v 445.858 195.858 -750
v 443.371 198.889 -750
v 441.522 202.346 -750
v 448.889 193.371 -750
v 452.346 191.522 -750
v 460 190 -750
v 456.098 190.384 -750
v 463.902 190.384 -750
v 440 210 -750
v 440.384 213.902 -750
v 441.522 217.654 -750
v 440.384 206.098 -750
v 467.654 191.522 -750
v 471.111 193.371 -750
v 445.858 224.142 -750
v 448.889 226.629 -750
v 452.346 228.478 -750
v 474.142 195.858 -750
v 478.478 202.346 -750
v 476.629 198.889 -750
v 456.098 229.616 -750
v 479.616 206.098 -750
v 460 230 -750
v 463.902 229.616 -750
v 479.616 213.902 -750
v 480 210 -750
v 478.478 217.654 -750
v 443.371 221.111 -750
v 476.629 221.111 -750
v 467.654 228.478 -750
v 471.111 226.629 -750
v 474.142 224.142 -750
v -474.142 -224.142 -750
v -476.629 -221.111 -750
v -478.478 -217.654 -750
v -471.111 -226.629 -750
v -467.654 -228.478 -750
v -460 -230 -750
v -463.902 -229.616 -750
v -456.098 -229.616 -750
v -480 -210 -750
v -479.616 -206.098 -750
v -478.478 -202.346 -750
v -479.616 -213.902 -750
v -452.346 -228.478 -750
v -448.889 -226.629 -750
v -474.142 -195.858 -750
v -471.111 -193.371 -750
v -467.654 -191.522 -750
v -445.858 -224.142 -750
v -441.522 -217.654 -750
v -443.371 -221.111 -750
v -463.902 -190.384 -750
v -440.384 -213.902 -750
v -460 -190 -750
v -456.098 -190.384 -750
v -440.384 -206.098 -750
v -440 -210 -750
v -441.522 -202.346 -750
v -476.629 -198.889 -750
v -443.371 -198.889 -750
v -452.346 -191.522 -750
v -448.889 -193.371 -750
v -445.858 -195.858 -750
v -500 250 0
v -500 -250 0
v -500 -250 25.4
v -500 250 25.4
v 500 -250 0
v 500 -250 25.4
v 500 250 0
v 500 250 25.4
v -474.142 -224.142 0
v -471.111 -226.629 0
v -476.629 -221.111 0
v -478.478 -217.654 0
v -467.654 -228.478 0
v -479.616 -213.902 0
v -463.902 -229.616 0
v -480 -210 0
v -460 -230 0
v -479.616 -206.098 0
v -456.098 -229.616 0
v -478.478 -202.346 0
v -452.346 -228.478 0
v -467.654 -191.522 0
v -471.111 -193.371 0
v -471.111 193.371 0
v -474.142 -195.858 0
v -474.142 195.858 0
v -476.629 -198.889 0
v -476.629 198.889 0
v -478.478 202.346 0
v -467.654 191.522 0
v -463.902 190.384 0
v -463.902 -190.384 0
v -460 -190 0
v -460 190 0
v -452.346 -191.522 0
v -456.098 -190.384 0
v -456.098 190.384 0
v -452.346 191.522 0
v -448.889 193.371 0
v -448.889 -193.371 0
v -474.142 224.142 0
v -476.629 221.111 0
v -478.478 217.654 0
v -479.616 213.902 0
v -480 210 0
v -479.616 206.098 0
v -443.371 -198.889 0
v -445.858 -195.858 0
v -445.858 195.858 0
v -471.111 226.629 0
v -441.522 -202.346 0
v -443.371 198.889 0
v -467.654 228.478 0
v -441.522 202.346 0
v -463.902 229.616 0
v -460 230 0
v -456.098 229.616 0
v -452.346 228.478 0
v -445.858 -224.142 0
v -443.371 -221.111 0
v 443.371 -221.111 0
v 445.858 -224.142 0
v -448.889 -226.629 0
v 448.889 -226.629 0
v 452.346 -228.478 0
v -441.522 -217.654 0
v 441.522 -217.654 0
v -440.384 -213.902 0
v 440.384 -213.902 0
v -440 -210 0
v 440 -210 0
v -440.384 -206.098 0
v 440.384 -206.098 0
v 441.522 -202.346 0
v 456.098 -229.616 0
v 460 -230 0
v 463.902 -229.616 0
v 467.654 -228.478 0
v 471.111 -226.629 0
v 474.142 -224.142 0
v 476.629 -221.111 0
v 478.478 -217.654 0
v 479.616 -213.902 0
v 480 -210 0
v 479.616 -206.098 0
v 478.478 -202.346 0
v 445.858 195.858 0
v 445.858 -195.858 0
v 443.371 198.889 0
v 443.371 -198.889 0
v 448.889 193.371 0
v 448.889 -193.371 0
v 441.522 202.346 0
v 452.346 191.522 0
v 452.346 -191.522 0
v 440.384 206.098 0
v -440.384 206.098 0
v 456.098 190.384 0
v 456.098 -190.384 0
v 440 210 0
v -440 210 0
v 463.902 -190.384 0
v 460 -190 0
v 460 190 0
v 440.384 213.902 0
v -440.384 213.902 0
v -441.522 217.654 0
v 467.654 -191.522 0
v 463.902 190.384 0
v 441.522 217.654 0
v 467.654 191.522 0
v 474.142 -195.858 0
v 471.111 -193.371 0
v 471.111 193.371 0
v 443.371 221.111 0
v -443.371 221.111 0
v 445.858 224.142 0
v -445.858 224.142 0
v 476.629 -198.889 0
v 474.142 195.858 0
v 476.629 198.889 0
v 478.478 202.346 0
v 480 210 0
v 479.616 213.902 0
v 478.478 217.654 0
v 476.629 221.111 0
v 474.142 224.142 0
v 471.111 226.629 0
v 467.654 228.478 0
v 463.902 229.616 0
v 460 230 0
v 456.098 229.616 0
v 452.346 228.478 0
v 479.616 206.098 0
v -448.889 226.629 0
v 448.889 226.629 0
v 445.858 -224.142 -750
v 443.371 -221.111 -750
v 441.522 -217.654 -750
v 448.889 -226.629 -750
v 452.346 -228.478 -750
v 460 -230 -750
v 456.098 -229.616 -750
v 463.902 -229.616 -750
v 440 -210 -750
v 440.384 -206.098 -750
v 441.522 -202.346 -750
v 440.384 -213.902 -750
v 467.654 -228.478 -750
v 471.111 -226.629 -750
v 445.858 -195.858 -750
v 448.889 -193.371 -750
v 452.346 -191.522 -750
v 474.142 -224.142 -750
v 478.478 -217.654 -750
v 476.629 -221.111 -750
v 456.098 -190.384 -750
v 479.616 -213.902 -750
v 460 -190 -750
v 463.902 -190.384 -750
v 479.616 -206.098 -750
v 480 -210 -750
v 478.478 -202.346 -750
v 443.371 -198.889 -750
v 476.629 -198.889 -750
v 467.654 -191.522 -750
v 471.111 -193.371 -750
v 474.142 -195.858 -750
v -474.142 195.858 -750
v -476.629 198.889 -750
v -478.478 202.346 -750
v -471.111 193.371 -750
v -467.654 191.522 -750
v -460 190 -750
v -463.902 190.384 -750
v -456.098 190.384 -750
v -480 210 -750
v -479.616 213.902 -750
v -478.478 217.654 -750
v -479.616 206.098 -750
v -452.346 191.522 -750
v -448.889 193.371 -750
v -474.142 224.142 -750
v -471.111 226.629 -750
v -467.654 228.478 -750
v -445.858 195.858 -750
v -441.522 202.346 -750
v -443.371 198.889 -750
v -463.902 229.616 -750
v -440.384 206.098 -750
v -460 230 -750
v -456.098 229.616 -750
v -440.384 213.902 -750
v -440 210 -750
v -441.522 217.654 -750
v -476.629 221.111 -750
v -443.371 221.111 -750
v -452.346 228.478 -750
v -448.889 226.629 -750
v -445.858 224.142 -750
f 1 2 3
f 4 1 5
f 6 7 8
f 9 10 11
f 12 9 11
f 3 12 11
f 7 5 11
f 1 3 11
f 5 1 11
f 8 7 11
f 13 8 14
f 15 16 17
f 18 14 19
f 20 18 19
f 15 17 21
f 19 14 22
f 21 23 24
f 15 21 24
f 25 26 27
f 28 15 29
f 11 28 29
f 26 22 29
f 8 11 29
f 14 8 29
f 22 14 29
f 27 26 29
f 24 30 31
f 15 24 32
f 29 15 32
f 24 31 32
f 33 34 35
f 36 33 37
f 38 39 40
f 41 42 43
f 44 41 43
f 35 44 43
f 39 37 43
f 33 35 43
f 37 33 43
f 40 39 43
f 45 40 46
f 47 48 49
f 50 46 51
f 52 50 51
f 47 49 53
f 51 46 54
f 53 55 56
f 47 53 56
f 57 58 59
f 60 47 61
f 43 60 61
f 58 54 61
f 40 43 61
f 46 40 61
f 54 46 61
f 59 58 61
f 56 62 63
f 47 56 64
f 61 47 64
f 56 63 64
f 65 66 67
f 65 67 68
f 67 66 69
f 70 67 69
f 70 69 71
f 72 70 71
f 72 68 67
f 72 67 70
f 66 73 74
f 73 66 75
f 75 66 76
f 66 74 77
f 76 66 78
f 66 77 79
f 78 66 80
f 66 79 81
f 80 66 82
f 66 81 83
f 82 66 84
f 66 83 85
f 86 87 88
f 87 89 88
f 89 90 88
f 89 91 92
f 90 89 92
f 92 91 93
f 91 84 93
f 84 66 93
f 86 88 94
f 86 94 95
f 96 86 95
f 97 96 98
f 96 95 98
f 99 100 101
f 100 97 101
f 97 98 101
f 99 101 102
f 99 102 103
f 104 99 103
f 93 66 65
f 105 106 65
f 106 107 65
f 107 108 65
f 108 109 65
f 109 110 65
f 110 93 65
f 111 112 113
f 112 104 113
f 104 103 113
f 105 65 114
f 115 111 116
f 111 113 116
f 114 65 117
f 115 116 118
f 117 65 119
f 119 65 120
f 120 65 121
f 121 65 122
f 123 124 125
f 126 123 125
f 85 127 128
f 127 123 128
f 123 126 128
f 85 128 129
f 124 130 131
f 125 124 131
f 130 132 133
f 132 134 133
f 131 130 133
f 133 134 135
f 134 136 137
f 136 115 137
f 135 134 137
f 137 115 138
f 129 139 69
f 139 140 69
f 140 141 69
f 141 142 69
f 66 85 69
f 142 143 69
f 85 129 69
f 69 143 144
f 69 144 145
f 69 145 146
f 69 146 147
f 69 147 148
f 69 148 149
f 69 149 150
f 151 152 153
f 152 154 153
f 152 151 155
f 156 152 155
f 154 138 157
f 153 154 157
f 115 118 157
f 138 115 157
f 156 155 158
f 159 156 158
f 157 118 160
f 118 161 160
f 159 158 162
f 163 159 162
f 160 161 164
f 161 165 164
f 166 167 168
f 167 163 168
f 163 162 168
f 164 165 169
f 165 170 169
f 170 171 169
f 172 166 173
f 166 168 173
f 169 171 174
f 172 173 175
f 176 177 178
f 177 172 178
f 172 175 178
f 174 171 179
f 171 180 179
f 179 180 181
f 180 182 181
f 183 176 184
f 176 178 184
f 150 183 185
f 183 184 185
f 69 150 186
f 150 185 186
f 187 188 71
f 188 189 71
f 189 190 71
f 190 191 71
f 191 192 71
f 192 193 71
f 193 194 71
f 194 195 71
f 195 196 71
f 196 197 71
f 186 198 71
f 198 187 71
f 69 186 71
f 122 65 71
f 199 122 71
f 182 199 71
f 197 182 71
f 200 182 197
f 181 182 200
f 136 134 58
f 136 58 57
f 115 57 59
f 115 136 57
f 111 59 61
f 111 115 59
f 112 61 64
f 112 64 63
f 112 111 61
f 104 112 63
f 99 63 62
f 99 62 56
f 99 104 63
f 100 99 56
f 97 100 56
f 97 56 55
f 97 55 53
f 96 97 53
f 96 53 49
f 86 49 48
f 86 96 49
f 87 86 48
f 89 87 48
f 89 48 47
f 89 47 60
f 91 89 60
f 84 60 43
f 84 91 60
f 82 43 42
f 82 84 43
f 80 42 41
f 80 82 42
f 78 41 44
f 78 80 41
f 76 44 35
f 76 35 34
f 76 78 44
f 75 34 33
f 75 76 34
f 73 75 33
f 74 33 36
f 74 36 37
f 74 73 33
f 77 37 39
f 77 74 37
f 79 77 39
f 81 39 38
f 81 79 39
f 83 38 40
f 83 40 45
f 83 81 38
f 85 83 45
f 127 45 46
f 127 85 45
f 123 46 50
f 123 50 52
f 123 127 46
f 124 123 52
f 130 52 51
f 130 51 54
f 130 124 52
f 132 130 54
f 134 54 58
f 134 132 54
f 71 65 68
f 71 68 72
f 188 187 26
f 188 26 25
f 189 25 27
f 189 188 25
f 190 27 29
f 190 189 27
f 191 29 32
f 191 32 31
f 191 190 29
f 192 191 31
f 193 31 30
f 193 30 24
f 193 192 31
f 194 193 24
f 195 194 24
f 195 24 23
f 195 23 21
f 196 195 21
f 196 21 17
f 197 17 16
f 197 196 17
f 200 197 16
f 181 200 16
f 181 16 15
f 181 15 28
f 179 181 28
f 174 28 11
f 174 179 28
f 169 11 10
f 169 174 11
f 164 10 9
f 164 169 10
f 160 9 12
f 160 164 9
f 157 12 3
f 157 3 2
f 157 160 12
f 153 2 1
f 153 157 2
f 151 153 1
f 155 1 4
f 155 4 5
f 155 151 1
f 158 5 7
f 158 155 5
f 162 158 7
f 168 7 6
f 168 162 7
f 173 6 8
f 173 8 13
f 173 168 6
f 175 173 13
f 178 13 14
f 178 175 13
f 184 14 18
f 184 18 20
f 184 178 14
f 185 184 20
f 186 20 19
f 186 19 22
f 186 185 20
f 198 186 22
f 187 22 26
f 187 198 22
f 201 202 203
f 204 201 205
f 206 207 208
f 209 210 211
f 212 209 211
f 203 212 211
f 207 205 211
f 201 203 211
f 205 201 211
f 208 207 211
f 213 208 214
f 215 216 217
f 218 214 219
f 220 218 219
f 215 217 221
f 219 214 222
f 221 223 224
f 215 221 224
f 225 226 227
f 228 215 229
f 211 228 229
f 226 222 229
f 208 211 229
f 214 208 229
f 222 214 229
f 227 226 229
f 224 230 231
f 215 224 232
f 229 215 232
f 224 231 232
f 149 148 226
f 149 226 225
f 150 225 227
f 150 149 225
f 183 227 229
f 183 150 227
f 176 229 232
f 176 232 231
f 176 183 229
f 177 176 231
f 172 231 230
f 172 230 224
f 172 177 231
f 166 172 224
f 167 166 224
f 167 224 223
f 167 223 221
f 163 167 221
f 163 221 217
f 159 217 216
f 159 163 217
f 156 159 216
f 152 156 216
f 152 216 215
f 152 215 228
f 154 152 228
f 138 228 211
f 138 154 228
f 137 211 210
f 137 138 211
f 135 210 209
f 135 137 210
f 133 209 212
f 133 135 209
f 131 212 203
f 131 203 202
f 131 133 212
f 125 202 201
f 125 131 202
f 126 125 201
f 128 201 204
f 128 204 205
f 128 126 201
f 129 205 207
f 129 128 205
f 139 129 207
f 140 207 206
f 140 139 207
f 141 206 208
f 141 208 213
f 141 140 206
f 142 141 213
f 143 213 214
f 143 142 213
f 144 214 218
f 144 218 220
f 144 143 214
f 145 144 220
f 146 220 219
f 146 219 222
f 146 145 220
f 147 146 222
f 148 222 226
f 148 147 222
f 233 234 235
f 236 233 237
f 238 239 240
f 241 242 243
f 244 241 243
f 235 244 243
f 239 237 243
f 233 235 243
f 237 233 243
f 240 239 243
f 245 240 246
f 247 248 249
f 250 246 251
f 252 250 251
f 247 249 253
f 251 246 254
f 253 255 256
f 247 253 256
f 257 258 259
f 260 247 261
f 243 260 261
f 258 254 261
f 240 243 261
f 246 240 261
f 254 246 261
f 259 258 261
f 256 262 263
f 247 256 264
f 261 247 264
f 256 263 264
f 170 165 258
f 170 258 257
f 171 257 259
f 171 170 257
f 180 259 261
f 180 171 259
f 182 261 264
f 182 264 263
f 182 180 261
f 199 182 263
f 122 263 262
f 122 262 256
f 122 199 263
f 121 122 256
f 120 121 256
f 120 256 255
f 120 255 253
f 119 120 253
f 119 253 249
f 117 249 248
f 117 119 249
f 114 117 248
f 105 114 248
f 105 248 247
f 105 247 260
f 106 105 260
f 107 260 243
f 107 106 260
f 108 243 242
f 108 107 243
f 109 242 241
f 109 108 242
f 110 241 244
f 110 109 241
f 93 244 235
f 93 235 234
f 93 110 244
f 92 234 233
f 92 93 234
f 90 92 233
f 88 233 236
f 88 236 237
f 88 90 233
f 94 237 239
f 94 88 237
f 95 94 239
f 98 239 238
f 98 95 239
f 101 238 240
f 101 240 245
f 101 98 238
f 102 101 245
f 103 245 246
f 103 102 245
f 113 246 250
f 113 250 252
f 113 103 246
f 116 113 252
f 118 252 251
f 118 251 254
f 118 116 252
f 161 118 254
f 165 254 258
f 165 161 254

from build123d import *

# Parameters (mm, degrees)
SKETCH1_W           = 1000
SKETCH1_H           = 500
BOSS_EXTRUDE1_DEPTH = 25.4
SKETCH2_R           = 20
BOSS_EXTRUDE2_DEPTH = 750


with BuildPart() as part:
    # Sketch1 → Boss-Extrude1 (new body)
    with BuildSketch(Plane.XY):
        Rectangle(SKETCH1_W, SKETCH1_H)
    extrude(amount=BOSS_EXTRUDE1_DEPTH)

    # Sketch2 → Boss-Extrude2 (add)
    with BuildSketch(Plane.XY):
        with Locations((460, 210)):
            Circle(SKETCH2_R)
        with Locations((460, -210)):
            Circle(SKETCH2_R)
        with Locations((-460, -210)):
            Circle(SKETCH2_R)
        with Locations((-460, 210)):
            Circle(SKETCH2_R)
    extrude(amount=-BOSS_EXTRUDE2_DEPTH)


solid = part.part
